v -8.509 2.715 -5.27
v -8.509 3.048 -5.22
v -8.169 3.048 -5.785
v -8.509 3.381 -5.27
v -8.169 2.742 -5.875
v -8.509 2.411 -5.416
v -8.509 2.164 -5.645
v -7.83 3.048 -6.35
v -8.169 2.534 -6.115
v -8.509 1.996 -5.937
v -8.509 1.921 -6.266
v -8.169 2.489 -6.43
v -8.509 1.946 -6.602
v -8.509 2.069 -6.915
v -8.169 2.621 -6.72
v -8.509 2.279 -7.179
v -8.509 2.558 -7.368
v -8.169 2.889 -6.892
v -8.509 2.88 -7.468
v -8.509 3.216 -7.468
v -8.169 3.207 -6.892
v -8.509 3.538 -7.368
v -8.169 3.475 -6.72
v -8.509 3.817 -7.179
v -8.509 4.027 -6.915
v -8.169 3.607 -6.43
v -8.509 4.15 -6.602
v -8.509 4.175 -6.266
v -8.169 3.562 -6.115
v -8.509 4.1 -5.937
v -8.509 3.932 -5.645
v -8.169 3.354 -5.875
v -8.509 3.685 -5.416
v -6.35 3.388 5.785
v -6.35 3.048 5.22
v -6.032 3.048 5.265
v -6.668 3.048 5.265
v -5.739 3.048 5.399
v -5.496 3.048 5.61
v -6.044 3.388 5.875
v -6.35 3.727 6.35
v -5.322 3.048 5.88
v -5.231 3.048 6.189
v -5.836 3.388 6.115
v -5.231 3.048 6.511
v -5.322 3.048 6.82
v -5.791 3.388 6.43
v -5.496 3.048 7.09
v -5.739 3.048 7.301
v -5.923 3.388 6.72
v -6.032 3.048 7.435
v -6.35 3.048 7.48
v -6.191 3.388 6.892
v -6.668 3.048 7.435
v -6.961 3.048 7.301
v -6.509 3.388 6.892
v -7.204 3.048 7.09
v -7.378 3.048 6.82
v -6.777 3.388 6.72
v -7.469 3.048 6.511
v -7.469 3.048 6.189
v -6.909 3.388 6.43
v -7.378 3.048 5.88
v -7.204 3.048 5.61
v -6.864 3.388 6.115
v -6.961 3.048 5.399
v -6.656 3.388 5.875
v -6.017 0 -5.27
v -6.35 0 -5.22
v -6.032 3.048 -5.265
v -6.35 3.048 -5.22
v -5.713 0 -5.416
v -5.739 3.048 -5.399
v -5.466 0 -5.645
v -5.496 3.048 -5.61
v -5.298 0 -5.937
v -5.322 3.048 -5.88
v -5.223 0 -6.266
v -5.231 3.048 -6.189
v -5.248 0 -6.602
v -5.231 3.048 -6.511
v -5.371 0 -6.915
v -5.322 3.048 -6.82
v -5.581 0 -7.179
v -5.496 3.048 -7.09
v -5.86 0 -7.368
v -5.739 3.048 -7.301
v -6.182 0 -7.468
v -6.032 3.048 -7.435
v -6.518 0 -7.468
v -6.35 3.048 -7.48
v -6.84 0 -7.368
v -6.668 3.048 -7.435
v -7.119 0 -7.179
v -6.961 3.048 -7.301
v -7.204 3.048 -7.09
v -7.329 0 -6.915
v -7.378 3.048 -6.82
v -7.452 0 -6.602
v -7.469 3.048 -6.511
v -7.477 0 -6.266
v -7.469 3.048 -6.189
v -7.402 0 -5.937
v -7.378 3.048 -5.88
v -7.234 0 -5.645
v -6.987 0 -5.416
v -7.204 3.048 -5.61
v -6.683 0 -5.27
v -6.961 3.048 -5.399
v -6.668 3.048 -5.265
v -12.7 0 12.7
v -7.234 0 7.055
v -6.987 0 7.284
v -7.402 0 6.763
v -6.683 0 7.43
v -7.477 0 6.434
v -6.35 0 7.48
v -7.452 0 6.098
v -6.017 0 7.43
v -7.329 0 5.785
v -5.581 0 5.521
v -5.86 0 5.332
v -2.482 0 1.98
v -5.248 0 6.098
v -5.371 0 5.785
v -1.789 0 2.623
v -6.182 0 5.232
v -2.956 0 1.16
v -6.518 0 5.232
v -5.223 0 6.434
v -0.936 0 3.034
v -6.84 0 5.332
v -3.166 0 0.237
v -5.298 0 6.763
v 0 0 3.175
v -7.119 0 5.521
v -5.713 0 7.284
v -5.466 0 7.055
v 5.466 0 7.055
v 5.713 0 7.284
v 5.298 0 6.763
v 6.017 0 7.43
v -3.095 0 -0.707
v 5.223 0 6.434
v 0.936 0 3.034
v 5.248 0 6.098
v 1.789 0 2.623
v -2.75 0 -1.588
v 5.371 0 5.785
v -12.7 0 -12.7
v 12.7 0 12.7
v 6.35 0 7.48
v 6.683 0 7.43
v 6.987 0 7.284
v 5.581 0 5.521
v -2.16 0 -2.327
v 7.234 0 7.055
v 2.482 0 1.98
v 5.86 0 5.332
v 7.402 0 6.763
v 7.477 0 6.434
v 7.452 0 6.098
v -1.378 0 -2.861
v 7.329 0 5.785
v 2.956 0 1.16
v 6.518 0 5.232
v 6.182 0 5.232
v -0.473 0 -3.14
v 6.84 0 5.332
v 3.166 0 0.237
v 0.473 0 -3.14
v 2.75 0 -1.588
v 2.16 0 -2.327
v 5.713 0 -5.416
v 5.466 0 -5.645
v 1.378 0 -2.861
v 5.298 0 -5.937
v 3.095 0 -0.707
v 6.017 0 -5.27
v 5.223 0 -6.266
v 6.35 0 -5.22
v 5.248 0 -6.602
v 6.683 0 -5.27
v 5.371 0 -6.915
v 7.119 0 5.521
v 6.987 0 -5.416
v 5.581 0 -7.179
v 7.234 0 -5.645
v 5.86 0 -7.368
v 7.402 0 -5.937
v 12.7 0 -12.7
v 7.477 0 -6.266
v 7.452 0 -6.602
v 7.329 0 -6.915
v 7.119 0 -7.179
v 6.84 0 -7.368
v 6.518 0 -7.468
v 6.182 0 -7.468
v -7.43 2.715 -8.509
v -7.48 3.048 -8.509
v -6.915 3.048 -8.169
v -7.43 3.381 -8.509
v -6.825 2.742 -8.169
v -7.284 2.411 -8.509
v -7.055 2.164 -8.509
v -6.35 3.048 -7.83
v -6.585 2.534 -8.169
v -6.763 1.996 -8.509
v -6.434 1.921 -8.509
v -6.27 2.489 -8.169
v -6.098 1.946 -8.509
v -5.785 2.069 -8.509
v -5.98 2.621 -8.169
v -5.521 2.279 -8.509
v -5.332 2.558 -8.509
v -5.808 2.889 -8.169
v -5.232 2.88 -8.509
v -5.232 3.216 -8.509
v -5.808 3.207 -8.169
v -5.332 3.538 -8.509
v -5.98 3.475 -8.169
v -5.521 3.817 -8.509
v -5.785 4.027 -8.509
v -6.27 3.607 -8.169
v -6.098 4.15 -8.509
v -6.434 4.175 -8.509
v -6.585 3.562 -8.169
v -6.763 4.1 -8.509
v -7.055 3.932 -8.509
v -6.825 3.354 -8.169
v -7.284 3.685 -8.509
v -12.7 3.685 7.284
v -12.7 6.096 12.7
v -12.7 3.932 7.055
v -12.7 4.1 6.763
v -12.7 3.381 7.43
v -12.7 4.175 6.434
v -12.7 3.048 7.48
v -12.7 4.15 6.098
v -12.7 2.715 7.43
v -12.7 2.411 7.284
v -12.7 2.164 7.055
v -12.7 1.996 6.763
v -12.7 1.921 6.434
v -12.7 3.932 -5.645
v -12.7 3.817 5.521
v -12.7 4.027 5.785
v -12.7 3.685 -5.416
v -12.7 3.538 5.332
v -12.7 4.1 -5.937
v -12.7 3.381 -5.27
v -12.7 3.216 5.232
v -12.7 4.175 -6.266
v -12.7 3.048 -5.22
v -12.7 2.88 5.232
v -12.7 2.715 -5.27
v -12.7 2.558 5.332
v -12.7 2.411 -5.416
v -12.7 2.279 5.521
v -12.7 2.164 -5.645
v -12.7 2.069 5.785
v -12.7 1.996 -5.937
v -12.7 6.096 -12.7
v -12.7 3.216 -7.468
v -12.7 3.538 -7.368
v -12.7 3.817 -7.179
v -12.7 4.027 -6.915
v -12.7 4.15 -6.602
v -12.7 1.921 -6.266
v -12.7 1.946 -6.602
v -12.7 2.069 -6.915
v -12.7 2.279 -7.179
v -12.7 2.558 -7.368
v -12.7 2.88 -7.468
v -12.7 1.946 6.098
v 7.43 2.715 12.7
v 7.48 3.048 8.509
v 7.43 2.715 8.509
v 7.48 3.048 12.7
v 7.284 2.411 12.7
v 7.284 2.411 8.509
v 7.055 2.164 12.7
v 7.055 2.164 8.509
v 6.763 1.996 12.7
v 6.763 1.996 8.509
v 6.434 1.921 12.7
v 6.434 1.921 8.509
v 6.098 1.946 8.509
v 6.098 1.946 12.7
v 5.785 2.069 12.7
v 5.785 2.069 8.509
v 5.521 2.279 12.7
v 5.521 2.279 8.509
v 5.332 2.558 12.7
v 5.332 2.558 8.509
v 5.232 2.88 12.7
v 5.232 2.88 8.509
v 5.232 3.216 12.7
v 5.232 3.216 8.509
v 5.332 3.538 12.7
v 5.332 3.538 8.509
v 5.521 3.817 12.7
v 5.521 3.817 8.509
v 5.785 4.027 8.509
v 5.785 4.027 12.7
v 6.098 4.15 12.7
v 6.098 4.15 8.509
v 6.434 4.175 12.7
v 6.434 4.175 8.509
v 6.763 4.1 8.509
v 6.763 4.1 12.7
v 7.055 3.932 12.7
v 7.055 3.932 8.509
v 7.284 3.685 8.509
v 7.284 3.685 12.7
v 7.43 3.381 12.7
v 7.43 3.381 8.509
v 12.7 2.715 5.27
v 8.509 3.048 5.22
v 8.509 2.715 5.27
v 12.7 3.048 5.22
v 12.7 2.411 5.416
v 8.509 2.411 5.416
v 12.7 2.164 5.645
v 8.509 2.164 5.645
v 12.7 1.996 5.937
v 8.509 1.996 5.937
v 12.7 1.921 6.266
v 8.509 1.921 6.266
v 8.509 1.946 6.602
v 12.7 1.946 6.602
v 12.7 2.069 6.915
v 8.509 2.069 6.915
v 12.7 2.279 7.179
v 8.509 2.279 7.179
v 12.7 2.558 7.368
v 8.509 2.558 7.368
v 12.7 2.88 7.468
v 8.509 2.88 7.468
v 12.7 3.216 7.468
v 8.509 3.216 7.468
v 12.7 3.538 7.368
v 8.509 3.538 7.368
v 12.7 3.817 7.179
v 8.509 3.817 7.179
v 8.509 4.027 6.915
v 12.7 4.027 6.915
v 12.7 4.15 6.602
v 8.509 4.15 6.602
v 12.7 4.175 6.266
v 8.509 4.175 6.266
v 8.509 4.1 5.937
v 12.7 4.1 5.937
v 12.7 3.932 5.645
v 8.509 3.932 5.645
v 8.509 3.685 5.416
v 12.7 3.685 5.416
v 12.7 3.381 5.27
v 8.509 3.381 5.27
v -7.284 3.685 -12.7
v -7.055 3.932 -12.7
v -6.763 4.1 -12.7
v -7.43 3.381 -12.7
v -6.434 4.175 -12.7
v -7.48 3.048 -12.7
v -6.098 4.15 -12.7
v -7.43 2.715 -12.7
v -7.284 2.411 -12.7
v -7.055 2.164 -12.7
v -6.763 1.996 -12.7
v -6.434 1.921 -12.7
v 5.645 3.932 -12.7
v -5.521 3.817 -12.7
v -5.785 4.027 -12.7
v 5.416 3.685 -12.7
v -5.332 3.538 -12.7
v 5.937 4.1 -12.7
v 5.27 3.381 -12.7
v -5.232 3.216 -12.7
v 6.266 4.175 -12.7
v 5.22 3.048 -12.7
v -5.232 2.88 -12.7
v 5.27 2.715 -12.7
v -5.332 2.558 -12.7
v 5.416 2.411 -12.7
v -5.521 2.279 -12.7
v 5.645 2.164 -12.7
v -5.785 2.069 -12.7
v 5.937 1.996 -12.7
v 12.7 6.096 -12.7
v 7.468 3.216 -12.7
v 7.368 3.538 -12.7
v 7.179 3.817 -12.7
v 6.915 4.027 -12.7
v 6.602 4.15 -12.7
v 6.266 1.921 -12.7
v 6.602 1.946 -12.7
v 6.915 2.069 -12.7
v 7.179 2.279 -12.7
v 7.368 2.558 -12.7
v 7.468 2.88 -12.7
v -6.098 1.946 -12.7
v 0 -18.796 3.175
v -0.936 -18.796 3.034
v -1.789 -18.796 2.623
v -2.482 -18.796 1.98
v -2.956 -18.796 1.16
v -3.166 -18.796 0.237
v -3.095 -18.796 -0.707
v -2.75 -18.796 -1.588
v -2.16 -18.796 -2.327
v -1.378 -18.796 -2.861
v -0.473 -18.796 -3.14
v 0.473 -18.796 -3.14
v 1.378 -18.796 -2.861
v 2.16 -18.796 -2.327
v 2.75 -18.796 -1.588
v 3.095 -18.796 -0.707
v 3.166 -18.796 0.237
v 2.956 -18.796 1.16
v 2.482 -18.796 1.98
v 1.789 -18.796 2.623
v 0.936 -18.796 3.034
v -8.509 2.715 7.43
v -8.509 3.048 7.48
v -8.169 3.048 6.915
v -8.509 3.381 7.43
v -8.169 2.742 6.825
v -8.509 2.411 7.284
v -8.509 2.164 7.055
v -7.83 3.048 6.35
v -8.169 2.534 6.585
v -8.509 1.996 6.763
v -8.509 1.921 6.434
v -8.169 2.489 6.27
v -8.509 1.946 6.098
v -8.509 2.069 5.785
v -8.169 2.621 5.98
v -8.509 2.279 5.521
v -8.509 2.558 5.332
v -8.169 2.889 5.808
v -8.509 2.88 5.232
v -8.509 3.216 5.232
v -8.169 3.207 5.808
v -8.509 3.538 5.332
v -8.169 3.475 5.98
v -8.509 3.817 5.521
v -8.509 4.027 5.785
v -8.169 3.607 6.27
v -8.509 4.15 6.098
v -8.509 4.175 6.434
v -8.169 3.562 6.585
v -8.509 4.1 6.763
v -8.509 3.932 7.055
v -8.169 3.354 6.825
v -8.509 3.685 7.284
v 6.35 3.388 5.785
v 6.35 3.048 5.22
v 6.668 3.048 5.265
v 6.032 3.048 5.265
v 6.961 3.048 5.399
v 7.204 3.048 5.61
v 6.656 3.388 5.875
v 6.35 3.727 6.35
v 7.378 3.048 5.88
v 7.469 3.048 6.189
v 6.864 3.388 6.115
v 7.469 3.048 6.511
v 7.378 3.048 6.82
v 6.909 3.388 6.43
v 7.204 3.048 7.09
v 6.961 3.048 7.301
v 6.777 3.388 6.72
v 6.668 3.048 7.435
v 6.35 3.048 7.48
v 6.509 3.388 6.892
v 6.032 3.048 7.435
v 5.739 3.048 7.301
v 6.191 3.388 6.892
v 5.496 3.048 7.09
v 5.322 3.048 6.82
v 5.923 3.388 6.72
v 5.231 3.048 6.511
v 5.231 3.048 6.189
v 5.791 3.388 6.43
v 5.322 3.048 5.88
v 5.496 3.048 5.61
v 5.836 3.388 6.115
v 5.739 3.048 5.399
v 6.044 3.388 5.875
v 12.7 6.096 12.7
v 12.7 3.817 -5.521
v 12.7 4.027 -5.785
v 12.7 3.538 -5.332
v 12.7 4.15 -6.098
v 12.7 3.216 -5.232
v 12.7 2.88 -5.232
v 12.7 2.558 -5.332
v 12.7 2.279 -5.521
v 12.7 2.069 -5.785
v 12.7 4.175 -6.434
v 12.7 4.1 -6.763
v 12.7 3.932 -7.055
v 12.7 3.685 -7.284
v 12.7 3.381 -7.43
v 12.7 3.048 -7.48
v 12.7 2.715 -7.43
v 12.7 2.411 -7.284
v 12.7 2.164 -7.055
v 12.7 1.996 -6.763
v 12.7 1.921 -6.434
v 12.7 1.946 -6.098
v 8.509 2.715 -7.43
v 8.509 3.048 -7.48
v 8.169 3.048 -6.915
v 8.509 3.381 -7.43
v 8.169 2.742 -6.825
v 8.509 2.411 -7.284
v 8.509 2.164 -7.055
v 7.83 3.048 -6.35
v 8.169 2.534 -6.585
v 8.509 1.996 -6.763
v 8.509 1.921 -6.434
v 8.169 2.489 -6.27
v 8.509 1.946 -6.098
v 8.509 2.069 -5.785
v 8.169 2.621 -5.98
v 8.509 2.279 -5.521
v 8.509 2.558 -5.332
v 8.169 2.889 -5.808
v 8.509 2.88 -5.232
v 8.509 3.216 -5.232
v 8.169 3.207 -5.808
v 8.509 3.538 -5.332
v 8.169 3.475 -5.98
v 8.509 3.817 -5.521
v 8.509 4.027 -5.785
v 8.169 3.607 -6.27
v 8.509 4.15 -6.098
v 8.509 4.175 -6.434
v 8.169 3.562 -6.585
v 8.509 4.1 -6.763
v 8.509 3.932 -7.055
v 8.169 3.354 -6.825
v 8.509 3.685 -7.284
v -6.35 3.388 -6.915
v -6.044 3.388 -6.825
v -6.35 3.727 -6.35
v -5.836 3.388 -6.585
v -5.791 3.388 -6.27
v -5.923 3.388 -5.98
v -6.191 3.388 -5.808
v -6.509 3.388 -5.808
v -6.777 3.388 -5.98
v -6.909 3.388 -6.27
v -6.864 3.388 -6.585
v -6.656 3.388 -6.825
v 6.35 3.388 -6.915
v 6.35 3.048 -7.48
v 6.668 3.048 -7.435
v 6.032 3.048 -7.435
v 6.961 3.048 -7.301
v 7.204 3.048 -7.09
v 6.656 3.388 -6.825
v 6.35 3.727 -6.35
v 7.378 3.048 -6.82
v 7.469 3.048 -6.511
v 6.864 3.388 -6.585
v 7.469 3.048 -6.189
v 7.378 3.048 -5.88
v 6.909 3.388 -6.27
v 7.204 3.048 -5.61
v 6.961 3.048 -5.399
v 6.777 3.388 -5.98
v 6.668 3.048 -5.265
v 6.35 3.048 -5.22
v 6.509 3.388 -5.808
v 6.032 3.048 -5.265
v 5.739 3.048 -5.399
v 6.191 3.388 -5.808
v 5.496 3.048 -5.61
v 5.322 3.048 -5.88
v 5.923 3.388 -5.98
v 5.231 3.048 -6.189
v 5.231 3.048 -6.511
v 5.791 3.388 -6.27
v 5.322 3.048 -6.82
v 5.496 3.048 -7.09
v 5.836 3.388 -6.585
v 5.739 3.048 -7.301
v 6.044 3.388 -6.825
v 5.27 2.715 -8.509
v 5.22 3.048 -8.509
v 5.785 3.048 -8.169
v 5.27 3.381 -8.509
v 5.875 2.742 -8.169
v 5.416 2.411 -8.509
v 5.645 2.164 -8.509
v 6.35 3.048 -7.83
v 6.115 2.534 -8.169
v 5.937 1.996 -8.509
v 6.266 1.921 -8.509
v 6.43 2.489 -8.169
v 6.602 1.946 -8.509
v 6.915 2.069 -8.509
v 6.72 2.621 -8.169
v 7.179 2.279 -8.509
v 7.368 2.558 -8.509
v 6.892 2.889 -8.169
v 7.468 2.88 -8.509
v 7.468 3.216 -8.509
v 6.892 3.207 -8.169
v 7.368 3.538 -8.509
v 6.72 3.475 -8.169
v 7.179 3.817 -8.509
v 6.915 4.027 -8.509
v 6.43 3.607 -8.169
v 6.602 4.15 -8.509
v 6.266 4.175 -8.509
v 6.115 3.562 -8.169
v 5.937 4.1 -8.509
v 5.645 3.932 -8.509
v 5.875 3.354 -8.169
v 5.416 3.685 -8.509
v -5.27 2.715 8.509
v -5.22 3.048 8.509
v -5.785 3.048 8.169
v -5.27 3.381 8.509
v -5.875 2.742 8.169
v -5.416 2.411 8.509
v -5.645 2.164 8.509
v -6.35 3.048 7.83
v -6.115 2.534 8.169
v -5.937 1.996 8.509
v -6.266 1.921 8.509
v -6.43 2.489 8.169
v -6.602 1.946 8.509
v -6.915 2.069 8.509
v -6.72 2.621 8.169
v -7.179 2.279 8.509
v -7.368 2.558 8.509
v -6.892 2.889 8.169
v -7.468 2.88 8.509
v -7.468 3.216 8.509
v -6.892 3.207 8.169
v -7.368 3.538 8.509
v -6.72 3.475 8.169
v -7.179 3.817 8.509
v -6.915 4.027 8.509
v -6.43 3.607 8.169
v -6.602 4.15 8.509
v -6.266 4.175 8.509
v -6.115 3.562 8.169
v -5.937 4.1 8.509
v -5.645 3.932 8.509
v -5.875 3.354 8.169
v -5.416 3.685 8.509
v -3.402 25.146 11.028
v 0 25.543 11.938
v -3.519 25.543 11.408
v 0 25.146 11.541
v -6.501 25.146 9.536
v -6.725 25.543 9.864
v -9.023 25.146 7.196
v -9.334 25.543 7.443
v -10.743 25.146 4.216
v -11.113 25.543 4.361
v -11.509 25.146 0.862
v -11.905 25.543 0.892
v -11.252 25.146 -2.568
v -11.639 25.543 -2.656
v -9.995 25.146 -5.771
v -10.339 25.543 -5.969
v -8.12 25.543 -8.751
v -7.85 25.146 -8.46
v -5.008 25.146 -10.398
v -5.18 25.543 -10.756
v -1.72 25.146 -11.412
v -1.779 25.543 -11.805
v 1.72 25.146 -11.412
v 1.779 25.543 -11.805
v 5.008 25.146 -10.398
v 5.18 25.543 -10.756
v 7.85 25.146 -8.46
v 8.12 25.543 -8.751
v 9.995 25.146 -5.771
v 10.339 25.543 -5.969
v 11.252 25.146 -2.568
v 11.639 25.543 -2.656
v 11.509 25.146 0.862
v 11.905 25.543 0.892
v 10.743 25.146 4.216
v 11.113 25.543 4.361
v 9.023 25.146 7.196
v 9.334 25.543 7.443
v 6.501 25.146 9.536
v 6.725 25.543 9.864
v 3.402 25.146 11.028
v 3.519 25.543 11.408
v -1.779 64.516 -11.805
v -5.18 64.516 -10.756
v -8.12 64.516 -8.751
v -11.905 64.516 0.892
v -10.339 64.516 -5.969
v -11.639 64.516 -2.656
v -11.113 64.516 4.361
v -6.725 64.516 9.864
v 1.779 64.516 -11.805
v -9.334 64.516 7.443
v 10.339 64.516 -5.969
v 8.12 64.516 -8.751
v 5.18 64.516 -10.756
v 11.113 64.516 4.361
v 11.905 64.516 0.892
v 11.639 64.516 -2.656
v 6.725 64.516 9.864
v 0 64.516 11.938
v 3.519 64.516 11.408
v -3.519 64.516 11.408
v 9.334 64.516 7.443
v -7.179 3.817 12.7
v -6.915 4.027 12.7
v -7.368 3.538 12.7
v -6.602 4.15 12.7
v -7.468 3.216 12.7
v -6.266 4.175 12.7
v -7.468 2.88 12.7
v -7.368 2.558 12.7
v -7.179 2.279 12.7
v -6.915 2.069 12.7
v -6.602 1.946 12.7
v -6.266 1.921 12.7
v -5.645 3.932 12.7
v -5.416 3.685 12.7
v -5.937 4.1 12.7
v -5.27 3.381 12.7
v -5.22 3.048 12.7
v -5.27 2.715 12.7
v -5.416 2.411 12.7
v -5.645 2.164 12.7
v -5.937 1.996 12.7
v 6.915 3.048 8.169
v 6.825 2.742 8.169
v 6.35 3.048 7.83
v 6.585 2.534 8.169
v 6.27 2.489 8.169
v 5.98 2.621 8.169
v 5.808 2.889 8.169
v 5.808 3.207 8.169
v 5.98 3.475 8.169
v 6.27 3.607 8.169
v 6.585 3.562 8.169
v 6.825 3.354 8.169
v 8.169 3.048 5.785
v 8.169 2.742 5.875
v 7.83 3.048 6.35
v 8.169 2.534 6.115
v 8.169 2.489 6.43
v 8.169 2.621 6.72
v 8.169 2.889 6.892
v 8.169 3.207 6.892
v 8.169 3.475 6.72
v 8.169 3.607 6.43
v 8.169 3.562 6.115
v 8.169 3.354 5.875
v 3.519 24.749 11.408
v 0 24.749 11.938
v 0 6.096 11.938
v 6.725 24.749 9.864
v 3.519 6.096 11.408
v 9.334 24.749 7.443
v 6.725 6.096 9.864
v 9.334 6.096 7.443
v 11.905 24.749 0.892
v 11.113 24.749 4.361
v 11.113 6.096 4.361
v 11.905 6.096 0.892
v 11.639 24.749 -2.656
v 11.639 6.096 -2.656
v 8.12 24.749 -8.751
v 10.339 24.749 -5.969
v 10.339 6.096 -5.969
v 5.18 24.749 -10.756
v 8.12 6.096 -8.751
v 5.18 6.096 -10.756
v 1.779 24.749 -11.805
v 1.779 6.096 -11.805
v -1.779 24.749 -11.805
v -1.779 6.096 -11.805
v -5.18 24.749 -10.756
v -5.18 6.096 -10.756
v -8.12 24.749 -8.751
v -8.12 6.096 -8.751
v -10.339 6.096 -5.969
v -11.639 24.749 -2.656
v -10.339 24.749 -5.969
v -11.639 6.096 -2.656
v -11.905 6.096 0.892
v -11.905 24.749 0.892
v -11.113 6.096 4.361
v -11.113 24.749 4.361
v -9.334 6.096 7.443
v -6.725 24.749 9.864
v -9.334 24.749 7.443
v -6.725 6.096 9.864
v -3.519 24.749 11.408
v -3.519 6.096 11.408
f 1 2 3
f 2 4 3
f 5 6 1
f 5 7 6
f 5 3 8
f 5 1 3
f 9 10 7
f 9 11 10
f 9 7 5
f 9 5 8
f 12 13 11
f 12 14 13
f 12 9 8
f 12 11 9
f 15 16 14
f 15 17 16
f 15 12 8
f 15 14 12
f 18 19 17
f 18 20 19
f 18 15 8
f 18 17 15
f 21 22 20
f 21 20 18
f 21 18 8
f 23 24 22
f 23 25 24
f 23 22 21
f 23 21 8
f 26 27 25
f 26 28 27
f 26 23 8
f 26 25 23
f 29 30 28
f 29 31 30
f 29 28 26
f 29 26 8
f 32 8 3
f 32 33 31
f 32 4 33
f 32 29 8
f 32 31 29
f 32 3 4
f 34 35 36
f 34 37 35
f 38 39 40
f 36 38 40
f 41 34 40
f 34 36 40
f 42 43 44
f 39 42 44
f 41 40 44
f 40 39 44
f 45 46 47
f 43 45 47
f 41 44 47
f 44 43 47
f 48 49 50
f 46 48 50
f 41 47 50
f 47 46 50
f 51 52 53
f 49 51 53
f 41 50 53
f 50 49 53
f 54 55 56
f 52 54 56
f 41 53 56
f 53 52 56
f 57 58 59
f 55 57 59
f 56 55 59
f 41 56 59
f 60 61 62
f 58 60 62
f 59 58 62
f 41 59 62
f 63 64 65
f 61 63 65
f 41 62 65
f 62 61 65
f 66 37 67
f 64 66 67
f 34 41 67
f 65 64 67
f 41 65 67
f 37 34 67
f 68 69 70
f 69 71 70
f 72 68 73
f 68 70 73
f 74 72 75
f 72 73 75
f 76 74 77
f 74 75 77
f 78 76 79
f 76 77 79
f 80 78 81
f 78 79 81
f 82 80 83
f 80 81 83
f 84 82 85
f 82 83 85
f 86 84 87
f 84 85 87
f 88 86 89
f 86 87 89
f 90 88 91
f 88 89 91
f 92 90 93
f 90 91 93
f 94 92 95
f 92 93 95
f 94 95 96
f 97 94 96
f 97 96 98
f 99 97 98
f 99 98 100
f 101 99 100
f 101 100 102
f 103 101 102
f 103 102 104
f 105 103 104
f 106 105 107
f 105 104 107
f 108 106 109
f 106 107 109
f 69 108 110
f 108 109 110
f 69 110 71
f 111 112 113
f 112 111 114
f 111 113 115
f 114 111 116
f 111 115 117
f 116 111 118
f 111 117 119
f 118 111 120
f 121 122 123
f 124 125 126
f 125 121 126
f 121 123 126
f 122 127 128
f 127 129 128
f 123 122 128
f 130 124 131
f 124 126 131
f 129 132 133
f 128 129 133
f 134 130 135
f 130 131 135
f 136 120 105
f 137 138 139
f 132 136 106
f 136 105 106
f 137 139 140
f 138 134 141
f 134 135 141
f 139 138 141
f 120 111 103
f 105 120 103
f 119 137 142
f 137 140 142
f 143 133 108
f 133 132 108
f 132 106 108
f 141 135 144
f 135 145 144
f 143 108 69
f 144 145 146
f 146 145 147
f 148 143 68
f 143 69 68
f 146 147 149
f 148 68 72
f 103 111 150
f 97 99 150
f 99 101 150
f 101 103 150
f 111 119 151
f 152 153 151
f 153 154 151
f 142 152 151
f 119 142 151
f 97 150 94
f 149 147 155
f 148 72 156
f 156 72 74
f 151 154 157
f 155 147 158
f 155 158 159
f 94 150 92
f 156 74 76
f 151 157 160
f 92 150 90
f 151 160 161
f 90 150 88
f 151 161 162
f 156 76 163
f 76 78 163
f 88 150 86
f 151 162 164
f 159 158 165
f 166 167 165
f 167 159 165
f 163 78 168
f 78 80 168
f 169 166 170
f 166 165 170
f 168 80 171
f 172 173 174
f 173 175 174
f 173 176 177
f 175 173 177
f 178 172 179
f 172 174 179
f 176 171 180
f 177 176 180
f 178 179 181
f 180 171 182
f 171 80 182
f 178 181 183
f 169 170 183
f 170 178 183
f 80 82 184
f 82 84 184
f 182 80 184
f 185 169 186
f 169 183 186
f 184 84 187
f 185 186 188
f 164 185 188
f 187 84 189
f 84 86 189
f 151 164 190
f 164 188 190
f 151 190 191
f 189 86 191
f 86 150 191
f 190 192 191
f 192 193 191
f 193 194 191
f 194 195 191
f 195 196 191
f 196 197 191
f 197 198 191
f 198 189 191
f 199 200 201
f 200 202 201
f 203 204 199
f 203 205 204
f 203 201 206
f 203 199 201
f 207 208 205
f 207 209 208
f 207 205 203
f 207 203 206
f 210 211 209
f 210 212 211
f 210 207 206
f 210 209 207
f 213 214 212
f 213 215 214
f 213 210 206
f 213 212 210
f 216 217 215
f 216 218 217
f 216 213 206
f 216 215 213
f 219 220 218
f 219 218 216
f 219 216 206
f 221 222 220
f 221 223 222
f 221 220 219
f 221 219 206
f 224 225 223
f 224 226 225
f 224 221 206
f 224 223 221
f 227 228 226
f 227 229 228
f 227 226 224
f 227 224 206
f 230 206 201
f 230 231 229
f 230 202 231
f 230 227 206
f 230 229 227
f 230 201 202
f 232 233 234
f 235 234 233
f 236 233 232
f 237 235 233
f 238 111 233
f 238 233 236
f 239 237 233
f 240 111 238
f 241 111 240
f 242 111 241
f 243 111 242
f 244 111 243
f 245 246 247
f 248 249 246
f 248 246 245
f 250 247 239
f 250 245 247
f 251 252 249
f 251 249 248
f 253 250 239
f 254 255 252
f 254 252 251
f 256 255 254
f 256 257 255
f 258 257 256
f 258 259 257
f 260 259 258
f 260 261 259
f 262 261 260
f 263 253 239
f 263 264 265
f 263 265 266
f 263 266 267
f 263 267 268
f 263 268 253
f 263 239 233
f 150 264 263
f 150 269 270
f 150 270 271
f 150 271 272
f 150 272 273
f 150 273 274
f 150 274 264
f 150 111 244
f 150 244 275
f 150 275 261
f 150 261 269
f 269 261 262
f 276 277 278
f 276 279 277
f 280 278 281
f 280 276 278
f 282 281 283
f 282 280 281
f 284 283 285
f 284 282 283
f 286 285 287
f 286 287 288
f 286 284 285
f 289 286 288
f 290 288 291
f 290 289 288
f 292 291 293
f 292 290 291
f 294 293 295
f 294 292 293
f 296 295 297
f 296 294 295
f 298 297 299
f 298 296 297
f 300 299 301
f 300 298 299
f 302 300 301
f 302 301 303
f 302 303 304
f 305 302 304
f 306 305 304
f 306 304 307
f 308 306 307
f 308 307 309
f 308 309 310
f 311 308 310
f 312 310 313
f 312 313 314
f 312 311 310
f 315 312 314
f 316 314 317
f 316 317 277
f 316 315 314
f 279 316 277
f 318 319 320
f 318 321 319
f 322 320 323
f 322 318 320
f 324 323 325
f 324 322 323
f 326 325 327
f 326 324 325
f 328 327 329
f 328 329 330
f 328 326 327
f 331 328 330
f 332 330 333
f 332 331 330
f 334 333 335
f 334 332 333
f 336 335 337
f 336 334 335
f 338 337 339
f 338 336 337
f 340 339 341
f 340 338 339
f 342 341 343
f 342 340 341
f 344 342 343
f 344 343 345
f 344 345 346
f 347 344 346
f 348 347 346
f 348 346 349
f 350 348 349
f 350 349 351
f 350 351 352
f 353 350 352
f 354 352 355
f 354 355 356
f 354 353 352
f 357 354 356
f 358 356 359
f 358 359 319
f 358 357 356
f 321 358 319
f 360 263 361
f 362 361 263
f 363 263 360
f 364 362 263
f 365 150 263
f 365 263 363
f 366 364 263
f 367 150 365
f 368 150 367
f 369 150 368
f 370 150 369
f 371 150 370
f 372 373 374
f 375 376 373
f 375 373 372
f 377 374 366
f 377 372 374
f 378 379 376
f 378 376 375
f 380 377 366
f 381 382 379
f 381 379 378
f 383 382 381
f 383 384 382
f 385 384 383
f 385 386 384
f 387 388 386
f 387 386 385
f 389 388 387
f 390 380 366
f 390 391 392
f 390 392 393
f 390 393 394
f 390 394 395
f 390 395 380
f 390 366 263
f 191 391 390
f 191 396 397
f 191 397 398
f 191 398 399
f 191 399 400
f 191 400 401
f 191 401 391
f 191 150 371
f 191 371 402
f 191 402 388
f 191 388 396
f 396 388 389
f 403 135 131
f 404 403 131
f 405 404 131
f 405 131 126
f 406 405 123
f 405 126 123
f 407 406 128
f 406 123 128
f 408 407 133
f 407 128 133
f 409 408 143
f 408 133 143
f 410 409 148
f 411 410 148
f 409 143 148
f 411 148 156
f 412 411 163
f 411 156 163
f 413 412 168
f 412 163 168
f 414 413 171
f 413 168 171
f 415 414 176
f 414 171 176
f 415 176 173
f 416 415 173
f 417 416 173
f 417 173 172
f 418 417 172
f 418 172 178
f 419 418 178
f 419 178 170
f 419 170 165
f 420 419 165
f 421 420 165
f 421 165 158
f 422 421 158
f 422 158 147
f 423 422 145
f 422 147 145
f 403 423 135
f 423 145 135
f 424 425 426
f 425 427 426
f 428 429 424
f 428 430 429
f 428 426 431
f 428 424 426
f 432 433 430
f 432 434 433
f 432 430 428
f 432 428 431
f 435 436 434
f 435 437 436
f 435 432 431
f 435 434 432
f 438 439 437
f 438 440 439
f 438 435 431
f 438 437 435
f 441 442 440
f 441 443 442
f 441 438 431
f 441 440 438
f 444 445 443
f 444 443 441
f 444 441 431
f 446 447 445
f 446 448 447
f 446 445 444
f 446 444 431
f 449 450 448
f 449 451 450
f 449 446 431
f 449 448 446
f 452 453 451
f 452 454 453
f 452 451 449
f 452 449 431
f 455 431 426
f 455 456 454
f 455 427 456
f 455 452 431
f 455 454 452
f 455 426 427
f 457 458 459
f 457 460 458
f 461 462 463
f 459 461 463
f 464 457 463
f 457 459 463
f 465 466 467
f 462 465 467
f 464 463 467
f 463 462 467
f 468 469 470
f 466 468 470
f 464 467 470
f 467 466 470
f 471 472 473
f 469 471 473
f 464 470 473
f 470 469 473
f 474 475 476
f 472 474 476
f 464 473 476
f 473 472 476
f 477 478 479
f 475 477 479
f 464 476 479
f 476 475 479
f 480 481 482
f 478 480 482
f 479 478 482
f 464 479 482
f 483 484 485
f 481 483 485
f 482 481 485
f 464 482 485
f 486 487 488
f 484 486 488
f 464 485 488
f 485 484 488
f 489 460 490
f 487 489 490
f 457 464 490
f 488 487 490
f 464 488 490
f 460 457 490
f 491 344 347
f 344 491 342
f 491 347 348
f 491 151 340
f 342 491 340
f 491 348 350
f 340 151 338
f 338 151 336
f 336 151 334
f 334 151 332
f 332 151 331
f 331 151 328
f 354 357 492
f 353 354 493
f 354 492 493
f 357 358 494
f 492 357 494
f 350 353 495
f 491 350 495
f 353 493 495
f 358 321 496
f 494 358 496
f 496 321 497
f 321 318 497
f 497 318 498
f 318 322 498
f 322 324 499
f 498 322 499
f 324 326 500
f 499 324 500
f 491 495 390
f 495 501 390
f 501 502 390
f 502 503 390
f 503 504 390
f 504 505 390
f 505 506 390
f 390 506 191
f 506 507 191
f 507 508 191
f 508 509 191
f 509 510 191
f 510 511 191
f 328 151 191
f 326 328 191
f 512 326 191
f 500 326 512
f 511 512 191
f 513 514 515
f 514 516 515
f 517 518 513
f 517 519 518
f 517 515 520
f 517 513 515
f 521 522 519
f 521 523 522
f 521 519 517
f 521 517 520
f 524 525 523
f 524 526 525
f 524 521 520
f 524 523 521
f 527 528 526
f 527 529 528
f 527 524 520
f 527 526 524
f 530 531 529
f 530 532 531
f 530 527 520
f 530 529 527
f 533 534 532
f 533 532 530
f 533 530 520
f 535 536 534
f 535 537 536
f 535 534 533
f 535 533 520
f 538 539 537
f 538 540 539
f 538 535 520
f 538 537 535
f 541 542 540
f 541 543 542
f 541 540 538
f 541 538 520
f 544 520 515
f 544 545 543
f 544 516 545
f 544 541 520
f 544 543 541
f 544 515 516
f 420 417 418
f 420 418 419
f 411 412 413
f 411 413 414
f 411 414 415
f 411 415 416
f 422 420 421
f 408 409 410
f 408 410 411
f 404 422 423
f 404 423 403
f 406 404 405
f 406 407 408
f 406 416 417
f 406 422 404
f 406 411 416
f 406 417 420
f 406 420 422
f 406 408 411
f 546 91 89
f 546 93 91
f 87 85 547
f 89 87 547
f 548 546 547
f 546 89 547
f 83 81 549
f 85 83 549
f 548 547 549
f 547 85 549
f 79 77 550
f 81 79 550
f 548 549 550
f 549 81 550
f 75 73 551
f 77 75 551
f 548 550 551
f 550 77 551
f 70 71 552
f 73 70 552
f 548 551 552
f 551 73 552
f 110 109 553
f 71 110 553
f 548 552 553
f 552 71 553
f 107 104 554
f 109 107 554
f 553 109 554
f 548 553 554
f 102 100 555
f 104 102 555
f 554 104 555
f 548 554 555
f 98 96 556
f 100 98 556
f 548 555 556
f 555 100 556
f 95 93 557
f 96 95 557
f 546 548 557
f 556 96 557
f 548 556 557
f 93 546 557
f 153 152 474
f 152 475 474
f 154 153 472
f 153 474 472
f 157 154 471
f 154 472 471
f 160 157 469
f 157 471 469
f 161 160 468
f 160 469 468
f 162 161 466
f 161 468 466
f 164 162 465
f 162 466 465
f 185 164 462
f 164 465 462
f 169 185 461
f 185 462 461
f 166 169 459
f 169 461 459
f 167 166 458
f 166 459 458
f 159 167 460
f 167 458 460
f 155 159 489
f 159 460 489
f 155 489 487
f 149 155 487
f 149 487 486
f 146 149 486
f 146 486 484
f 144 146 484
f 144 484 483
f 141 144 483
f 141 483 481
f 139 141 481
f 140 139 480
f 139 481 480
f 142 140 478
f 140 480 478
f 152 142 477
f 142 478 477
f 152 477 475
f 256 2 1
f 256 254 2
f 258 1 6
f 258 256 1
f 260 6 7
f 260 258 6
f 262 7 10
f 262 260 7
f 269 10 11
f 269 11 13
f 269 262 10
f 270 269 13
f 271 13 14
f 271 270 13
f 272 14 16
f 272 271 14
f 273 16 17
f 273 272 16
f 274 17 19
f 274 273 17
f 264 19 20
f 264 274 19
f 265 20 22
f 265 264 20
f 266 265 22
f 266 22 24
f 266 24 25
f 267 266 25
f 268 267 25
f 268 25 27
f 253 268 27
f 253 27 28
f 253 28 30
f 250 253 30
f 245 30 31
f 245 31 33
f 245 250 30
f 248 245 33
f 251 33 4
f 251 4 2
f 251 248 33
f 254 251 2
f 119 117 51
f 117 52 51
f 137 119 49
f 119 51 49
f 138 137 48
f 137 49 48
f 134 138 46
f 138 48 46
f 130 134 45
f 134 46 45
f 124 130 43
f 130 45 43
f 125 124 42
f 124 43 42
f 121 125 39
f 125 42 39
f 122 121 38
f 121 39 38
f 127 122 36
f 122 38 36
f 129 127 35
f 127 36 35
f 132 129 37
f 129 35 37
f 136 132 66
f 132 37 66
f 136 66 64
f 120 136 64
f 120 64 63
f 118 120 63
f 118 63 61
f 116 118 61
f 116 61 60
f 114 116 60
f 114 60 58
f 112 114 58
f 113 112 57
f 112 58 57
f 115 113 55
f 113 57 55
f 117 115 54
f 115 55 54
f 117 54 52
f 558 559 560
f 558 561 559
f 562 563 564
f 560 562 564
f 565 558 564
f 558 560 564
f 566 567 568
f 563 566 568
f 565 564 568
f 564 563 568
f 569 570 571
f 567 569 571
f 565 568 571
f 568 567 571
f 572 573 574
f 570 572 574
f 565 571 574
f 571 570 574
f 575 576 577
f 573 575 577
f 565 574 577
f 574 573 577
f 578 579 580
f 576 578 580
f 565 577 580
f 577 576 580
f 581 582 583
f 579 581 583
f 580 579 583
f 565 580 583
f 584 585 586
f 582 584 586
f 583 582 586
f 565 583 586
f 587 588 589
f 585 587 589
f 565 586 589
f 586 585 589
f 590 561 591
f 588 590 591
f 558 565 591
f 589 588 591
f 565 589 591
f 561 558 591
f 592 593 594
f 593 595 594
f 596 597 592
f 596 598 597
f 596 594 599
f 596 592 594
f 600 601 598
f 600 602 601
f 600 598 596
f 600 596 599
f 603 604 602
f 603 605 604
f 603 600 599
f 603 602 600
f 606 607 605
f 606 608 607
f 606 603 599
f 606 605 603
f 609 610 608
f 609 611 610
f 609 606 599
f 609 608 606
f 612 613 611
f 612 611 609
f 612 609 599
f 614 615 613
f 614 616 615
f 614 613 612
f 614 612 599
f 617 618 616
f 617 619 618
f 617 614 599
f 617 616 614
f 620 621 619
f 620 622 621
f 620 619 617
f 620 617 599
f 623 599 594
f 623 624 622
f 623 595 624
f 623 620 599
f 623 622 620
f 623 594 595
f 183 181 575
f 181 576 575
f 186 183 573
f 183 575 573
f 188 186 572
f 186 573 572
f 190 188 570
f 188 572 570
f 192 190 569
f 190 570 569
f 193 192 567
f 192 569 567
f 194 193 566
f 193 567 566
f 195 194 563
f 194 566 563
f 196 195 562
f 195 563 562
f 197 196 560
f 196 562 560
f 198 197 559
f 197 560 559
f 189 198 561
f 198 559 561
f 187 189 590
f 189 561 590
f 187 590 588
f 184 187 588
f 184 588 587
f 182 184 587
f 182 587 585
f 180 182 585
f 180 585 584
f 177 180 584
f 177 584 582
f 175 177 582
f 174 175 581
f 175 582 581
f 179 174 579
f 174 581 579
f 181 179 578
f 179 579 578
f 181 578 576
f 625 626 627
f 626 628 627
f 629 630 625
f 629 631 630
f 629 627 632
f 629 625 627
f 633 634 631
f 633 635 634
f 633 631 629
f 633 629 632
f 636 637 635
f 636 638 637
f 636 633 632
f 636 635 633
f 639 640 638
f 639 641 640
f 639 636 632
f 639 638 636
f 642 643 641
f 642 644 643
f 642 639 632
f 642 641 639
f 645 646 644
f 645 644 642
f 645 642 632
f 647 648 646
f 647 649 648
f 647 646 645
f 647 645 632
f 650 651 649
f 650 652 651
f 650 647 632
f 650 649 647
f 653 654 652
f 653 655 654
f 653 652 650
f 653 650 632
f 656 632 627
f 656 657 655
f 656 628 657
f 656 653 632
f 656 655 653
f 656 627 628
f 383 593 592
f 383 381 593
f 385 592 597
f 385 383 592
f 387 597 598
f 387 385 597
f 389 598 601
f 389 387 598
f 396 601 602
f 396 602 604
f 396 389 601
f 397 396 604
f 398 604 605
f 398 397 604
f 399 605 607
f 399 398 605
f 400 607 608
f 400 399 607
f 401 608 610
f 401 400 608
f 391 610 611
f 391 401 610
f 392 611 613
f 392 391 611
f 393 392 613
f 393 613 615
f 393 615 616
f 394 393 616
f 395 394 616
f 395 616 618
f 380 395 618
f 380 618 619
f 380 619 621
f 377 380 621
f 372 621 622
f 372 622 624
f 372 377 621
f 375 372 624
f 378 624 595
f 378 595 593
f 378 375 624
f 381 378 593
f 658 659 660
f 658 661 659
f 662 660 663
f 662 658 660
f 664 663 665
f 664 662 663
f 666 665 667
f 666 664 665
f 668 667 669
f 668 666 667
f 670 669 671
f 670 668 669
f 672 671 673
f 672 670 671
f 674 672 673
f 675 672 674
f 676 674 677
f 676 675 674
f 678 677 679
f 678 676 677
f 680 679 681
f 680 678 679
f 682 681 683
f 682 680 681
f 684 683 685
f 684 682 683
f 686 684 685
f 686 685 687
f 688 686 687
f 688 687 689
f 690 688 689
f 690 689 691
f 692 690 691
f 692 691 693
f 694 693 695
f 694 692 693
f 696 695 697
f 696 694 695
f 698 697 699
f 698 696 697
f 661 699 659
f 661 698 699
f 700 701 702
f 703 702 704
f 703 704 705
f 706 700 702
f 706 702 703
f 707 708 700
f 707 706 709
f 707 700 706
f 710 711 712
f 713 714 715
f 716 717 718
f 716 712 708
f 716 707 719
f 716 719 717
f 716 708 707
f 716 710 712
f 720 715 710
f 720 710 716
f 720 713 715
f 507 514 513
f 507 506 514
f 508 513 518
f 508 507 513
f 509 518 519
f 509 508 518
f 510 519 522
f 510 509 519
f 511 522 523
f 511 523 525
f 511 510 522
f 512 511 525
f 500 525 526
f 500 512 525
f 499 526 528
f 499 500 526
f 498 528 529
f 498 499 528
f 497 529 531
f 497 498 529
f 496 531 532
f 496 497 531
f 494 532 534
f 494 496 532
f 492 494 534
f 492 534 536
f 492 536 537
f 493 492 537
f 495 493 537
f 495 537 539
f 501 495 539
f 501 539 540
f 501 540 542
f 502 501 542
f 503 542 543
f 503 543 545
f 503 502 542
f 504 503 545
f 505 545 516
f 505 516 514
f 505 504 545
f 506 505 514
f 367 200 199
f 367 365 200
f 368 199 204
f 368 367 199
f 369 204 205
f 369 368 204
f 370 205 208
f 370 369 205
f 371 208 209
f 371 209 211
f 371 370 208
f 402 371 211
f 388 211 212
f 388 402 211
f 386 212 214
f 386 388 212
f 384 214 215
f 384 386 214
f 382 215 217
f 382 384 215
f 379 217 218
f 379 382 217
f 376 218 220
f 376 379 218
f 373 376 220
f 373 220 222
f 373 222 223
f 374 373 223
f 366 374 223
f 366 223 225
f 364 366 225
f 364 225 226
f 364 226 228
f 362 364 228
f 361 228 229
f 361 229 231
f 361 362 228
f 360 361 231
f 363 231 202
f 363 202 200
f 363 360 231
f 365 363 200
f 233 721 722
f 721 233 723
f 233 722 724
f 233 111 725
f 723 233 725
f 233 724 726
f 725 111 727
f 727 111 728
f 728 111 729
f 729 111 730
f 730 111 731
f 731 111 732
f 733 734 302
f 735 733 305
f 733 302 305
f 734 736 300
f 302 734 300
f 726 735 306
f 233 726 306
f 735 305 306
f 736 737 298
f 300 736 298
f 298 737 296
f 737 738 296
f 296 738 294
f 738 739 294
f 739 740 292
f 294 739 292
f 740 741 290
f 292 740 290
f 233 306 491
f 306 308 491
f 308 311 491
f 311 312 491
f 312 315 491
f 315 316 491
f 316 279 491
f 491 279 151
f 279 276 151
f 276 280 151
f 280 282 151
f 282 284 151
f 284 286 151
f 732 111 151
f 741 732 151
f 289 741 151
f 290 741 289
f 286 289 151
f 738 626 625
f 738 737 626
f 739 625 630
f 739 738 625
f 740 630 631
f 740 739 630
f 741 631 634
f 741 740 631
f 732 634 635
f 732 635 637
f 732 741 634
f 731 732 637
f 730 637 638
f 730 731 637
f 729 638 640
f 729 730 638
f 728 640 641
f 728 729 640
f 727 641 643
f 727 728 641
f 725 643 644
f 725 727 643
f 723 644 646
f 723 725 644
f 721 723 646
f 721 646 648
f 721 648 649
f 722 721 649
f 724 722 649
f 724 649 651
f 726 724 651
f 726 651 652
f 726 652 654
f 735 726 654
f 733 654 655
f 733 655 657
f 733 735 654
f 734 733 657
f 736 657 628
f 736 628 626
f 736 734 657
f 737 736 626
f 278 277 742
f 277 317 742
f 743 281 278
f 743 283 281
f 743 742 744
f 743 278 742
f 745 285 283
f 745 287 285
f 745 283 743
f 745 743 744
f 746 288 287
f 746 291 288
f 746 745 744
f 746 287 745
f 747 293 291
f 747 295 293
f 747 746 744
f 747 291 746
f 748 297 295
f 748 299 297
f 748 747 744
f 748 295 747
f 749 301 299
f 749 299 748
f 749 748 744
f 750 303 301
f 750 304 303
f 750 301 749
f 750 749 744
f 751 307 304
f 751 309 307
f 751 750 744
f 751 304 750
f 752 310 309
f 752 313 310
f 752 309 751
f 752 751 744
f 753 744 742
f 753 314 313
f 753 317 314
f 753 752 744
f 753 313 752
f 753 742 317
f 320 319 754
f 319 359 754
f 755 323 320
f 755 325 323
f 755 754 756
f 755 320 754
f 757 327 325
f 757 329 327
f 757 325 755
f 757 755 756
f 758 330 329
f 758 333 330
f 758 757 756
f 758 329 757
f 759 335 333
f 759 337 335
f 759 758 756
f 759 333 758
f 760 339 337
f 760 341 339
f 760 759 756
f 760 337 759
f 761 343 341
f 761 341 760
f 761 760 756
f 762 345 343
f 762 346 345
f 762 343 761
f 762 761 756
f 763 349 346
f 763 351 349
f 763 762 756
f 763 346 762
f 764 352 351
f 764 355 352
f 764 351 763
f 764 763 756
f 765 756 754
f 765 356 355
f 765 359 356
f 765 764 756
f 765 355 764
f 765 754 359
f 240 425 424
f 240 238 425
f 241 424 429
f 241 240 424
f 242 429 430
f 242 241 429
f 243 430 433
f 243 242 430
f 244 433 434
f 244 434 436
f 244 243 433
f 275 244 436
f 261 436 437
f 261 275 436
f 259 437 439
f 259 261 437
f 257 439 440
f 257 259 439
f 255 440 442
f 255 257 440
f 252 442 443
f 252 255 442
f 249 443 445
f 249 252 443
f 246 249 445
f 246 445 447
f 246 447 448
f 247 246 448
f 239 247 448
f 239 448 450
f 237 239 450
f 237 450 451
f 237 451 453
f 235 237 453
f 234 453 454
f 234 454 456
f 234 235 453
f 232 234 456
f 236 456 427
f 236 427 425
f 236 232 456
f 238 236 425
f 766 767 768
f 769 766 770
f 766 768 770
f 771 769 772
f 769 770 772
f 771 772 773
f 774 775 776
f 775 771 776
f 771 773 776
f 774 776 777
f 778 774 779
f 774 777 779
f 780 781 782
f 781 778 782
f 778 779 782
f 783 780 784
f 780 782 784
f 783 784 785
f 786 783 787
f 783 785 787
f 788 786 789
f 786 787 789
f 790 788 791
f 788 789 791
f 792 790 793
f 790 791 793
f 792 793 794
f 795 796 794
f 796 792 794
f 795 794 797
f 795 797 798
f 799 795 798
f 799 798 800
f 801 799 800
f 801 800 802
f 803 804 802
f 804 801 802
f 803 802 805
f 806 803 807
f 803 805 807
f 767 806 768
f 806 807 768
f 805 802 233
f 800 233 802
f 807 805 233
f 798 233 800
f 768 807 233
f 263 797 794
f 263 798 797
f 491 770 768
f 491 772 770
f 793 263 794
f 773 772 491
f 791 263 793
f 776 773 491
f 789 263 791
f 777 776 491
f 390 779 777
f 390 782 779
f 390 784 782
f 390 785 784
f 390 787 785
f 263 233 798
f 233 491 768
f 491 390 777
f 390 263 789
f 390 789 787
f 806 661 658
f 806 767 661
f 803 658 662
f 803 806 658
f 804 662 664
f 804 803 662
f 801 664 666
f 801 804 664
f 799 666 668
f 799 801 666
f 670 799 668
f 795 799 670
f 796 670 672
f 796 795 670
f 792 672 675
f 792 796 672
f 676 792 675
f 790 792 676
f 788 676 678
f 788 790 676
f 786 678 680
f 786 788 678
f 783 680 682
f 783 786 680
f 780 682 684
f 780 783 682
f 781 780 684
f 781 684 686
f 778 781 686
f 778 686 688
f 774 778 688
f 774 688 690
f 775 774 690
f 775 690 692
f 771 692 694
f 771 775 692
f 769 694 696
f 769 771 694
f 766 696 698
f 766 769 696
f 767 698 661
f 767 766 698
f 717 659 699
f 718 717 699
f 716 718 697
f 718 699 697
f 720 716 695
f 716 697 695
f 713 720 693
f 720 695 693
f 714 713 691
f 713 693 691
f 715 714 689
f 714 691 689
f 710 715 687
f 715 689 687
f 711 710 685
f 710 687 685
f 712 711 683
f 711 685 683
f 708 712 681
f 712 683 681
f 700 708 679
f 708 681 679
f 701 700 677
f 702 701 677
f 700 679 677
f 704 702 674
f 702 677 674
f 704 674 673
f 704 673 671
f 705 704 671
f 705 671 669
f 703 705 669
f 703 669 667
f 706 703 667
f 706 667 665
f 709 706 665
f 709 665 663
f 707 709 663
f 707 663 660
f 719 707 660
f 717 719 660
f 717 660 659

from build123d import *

# Parameters (mm, degrees)
SKETCH1_W                      = 25.4
SKETCH1_H                      = 25.4
EXTRUDE1_DEPTH                 = 6.096
SKETCH2_R                      = 11.938
EXTRUDE2_DEPTH                 = 58.42
SKETCH3_R                      = 3.175
EXTRUDE3_DEPTH                 = 18.796
F_4_40_TAPPED_HOLE3_D          = 2.2606
F_4_40_TAPPED_HOLE3_DEPTH      = 3.048
F_4_40_TAPPED_HOLE3_TIP        = 0.679152758
F_4_40_TAPPED_HOLE4_AT_2_COUNT = 2
F_4_40_TAPPED_HOLE4_AT_2_PITCH = 12.7
CIRPATTERN1_COUNT              = 4


with BuildPart() as part:
    # Sketch1 → Extrude1 (new body)
    with BuildSketch(Plane(origin=(0, 0, 0), x_dir=(1, 0, 0), z_dir=(0, 1, 0))):
        Rectangle(SKETCH1_W, SKETCH1_H)
    extrude(amount=EXTRUDE1_DEPTH)

    # Sketch2 → Extrude2 (add)
    with BuildSketch(Plane(origin=(0, 6.096, 0), x_dir=(1, 0, 0), z_dir=(0, 1, 0))):
        with Locations(Location((0, 0, 0), (0, 0, 270))):  # turned: the seam where the file's is
            Circle(SKETCH2_R)
    extrude(amount=EXTRUDE2_DEPTH)

    # Sketch3 → Extrude3 (add)
    with BuildSketch(Plane.XZ):
        with Locations(Location((0, 0, 0), (0, 0, 90))):  # turned: the seam where the file's is
            Circle(SKETCH3_R)
    extrude(amount=EXTRUDE3_DEPTH)

    # #4-40 Tapped Hole3
    with Locations(Plane(origin=(6.35, 0, -6.35), x_dir=(0, 0, -1), z_dir=(0, -1, 0))):
        with Locations((0, 0), (-12.7, 0), (-12.7, -12.7), (0, -12.7)):
            Hole(F_4_40_TAPPED_HOLE3_D / 2, depth=F_4_40_TAPPED_HOLE3_DEPTH)
            with Locations((0, 0, -(F_4_40_TAPPED_HOLE3_DEPTH + F_4_40_TAPPED_HOLE3_TIP / 2))):  # 118° drill point
                Cone(0, F_4_40_TAPPED_HOLE3_D / 2, F_4_40_TAPPED_HOLE3_TIP, mode=Mode.SUBTRACT)

    # Sketch12 → #4-40 Tapped Hole4 (revolve, cut)
    with BuildSketch(Plane(origin=(-12.7, 3.048, -6.35), x_dir=(0, 0, 1), z_dir=(0, 1, 0))):
        Polygon((0, 0), (0, 4.870152758), (1.1303, 4.191), (1.1303, 0), align=None)
    f_4_40_tapped_hole4 = revolve(axis=Axis((-19.05, 3.048, -6.35), (1, 0, 0)), mode=Mode.SUBTRACT)

    # #4-40 Tapped Hole4 at 2: #4-40 Tapped Hole4 ×2
    with Locations(*[(0, 0, i * F_4_40_TAPPED_HOLE4_AT_2_PITCH) for i in range(1, F_4_40_TAPPED_HOLE4_AT_2_COUNT)]):
        add(f_4_40_tapped_hole4, mode=Mode.SUBTRACT)

    # CirPattern1: #4-40 Tapped Hole4 ×4 about axis
    cirpattern1_axis = Axis((0, -18.796, 0), (0, 1, 0))
    for i in range(1, CIRPATTERN1_COUNT):
        add(f_4_40_tapped_hole4.rotate(cirpattern1_axis, i * 360 / CIRPATTERN1_COUNT), mode=Mode.SUBTRACT)

    # CirPattern1 copy 1 sketch → CirPattern1 copy 1 (revolve, cut)
    with BuildSketch(Plane(origin=(6.35, 3.048, 12.7), x_dir=(1, 0, 0), z_dir=(0, 1, 0))):
        Polygon((0, 0), (0, 4.870152758), (1.1303, 4.191), (1.1303, 0), align=None)
    revolve(axis=Axis((6.35, 3.048, 19.05), (0, 0, -1)), mode=Mode.SUBTRACT)

    # CirPattern1 copy 2 sketch → CirPattern1 copy 2 (revolve, cut)
    with BuildSketch(Plane(origin=(12.7, 3.048, -6.35), x_dir=(0, 0, -1), z_dir=(0, 1, 0))):
        Polygon((0, 0), (0, 4.870152758), (1.1303, 4.191), (1.1303, 0), align=None)
    revolve(axis=Axis((19.05, 3.048, -6.35), (-1, 0, 0)), mode=Mode.SUBTRACT)

    # CirPattern1 copy 3 sketch → CirPattern1 copy 3 (revolve, cut)
    with BuildSketch(Plane(origin=(-6.35, 3.048, -12.7), x_dir=(-1, 0, 0), z_dir=(0, 1, 0))):
        Polygon((0, 0), (0, 4.870152758), (1.1303, 4.191), (1.1303, 0), align=None)
    revolve(axis=Axis((-6.35, 3.048, -19.05), (0, 0, 1)), mode=Mode.SUBTRACT)

    # Sketch13 → Cut-Revolve1 (revolve, cut)
    with BuildSketch(Plane.XY, mode=Mode.PRIVATE) as cut_revolve1_sk:
        Polygon((-11.938, 25.542875), (-11.541125, 25.146), (-11.938, 24.749125), align=None)
    revolve(cut_revolve1_sk.sketch.rotate(Axis((0, 64.516, 0), (0, -1, 0)), 270), axis=Axis((0, 64.516, 0), (0, -1, 0)), mode=Mode.SUBTRACT)  # turned: the seam where the file's is


solid = part.part
